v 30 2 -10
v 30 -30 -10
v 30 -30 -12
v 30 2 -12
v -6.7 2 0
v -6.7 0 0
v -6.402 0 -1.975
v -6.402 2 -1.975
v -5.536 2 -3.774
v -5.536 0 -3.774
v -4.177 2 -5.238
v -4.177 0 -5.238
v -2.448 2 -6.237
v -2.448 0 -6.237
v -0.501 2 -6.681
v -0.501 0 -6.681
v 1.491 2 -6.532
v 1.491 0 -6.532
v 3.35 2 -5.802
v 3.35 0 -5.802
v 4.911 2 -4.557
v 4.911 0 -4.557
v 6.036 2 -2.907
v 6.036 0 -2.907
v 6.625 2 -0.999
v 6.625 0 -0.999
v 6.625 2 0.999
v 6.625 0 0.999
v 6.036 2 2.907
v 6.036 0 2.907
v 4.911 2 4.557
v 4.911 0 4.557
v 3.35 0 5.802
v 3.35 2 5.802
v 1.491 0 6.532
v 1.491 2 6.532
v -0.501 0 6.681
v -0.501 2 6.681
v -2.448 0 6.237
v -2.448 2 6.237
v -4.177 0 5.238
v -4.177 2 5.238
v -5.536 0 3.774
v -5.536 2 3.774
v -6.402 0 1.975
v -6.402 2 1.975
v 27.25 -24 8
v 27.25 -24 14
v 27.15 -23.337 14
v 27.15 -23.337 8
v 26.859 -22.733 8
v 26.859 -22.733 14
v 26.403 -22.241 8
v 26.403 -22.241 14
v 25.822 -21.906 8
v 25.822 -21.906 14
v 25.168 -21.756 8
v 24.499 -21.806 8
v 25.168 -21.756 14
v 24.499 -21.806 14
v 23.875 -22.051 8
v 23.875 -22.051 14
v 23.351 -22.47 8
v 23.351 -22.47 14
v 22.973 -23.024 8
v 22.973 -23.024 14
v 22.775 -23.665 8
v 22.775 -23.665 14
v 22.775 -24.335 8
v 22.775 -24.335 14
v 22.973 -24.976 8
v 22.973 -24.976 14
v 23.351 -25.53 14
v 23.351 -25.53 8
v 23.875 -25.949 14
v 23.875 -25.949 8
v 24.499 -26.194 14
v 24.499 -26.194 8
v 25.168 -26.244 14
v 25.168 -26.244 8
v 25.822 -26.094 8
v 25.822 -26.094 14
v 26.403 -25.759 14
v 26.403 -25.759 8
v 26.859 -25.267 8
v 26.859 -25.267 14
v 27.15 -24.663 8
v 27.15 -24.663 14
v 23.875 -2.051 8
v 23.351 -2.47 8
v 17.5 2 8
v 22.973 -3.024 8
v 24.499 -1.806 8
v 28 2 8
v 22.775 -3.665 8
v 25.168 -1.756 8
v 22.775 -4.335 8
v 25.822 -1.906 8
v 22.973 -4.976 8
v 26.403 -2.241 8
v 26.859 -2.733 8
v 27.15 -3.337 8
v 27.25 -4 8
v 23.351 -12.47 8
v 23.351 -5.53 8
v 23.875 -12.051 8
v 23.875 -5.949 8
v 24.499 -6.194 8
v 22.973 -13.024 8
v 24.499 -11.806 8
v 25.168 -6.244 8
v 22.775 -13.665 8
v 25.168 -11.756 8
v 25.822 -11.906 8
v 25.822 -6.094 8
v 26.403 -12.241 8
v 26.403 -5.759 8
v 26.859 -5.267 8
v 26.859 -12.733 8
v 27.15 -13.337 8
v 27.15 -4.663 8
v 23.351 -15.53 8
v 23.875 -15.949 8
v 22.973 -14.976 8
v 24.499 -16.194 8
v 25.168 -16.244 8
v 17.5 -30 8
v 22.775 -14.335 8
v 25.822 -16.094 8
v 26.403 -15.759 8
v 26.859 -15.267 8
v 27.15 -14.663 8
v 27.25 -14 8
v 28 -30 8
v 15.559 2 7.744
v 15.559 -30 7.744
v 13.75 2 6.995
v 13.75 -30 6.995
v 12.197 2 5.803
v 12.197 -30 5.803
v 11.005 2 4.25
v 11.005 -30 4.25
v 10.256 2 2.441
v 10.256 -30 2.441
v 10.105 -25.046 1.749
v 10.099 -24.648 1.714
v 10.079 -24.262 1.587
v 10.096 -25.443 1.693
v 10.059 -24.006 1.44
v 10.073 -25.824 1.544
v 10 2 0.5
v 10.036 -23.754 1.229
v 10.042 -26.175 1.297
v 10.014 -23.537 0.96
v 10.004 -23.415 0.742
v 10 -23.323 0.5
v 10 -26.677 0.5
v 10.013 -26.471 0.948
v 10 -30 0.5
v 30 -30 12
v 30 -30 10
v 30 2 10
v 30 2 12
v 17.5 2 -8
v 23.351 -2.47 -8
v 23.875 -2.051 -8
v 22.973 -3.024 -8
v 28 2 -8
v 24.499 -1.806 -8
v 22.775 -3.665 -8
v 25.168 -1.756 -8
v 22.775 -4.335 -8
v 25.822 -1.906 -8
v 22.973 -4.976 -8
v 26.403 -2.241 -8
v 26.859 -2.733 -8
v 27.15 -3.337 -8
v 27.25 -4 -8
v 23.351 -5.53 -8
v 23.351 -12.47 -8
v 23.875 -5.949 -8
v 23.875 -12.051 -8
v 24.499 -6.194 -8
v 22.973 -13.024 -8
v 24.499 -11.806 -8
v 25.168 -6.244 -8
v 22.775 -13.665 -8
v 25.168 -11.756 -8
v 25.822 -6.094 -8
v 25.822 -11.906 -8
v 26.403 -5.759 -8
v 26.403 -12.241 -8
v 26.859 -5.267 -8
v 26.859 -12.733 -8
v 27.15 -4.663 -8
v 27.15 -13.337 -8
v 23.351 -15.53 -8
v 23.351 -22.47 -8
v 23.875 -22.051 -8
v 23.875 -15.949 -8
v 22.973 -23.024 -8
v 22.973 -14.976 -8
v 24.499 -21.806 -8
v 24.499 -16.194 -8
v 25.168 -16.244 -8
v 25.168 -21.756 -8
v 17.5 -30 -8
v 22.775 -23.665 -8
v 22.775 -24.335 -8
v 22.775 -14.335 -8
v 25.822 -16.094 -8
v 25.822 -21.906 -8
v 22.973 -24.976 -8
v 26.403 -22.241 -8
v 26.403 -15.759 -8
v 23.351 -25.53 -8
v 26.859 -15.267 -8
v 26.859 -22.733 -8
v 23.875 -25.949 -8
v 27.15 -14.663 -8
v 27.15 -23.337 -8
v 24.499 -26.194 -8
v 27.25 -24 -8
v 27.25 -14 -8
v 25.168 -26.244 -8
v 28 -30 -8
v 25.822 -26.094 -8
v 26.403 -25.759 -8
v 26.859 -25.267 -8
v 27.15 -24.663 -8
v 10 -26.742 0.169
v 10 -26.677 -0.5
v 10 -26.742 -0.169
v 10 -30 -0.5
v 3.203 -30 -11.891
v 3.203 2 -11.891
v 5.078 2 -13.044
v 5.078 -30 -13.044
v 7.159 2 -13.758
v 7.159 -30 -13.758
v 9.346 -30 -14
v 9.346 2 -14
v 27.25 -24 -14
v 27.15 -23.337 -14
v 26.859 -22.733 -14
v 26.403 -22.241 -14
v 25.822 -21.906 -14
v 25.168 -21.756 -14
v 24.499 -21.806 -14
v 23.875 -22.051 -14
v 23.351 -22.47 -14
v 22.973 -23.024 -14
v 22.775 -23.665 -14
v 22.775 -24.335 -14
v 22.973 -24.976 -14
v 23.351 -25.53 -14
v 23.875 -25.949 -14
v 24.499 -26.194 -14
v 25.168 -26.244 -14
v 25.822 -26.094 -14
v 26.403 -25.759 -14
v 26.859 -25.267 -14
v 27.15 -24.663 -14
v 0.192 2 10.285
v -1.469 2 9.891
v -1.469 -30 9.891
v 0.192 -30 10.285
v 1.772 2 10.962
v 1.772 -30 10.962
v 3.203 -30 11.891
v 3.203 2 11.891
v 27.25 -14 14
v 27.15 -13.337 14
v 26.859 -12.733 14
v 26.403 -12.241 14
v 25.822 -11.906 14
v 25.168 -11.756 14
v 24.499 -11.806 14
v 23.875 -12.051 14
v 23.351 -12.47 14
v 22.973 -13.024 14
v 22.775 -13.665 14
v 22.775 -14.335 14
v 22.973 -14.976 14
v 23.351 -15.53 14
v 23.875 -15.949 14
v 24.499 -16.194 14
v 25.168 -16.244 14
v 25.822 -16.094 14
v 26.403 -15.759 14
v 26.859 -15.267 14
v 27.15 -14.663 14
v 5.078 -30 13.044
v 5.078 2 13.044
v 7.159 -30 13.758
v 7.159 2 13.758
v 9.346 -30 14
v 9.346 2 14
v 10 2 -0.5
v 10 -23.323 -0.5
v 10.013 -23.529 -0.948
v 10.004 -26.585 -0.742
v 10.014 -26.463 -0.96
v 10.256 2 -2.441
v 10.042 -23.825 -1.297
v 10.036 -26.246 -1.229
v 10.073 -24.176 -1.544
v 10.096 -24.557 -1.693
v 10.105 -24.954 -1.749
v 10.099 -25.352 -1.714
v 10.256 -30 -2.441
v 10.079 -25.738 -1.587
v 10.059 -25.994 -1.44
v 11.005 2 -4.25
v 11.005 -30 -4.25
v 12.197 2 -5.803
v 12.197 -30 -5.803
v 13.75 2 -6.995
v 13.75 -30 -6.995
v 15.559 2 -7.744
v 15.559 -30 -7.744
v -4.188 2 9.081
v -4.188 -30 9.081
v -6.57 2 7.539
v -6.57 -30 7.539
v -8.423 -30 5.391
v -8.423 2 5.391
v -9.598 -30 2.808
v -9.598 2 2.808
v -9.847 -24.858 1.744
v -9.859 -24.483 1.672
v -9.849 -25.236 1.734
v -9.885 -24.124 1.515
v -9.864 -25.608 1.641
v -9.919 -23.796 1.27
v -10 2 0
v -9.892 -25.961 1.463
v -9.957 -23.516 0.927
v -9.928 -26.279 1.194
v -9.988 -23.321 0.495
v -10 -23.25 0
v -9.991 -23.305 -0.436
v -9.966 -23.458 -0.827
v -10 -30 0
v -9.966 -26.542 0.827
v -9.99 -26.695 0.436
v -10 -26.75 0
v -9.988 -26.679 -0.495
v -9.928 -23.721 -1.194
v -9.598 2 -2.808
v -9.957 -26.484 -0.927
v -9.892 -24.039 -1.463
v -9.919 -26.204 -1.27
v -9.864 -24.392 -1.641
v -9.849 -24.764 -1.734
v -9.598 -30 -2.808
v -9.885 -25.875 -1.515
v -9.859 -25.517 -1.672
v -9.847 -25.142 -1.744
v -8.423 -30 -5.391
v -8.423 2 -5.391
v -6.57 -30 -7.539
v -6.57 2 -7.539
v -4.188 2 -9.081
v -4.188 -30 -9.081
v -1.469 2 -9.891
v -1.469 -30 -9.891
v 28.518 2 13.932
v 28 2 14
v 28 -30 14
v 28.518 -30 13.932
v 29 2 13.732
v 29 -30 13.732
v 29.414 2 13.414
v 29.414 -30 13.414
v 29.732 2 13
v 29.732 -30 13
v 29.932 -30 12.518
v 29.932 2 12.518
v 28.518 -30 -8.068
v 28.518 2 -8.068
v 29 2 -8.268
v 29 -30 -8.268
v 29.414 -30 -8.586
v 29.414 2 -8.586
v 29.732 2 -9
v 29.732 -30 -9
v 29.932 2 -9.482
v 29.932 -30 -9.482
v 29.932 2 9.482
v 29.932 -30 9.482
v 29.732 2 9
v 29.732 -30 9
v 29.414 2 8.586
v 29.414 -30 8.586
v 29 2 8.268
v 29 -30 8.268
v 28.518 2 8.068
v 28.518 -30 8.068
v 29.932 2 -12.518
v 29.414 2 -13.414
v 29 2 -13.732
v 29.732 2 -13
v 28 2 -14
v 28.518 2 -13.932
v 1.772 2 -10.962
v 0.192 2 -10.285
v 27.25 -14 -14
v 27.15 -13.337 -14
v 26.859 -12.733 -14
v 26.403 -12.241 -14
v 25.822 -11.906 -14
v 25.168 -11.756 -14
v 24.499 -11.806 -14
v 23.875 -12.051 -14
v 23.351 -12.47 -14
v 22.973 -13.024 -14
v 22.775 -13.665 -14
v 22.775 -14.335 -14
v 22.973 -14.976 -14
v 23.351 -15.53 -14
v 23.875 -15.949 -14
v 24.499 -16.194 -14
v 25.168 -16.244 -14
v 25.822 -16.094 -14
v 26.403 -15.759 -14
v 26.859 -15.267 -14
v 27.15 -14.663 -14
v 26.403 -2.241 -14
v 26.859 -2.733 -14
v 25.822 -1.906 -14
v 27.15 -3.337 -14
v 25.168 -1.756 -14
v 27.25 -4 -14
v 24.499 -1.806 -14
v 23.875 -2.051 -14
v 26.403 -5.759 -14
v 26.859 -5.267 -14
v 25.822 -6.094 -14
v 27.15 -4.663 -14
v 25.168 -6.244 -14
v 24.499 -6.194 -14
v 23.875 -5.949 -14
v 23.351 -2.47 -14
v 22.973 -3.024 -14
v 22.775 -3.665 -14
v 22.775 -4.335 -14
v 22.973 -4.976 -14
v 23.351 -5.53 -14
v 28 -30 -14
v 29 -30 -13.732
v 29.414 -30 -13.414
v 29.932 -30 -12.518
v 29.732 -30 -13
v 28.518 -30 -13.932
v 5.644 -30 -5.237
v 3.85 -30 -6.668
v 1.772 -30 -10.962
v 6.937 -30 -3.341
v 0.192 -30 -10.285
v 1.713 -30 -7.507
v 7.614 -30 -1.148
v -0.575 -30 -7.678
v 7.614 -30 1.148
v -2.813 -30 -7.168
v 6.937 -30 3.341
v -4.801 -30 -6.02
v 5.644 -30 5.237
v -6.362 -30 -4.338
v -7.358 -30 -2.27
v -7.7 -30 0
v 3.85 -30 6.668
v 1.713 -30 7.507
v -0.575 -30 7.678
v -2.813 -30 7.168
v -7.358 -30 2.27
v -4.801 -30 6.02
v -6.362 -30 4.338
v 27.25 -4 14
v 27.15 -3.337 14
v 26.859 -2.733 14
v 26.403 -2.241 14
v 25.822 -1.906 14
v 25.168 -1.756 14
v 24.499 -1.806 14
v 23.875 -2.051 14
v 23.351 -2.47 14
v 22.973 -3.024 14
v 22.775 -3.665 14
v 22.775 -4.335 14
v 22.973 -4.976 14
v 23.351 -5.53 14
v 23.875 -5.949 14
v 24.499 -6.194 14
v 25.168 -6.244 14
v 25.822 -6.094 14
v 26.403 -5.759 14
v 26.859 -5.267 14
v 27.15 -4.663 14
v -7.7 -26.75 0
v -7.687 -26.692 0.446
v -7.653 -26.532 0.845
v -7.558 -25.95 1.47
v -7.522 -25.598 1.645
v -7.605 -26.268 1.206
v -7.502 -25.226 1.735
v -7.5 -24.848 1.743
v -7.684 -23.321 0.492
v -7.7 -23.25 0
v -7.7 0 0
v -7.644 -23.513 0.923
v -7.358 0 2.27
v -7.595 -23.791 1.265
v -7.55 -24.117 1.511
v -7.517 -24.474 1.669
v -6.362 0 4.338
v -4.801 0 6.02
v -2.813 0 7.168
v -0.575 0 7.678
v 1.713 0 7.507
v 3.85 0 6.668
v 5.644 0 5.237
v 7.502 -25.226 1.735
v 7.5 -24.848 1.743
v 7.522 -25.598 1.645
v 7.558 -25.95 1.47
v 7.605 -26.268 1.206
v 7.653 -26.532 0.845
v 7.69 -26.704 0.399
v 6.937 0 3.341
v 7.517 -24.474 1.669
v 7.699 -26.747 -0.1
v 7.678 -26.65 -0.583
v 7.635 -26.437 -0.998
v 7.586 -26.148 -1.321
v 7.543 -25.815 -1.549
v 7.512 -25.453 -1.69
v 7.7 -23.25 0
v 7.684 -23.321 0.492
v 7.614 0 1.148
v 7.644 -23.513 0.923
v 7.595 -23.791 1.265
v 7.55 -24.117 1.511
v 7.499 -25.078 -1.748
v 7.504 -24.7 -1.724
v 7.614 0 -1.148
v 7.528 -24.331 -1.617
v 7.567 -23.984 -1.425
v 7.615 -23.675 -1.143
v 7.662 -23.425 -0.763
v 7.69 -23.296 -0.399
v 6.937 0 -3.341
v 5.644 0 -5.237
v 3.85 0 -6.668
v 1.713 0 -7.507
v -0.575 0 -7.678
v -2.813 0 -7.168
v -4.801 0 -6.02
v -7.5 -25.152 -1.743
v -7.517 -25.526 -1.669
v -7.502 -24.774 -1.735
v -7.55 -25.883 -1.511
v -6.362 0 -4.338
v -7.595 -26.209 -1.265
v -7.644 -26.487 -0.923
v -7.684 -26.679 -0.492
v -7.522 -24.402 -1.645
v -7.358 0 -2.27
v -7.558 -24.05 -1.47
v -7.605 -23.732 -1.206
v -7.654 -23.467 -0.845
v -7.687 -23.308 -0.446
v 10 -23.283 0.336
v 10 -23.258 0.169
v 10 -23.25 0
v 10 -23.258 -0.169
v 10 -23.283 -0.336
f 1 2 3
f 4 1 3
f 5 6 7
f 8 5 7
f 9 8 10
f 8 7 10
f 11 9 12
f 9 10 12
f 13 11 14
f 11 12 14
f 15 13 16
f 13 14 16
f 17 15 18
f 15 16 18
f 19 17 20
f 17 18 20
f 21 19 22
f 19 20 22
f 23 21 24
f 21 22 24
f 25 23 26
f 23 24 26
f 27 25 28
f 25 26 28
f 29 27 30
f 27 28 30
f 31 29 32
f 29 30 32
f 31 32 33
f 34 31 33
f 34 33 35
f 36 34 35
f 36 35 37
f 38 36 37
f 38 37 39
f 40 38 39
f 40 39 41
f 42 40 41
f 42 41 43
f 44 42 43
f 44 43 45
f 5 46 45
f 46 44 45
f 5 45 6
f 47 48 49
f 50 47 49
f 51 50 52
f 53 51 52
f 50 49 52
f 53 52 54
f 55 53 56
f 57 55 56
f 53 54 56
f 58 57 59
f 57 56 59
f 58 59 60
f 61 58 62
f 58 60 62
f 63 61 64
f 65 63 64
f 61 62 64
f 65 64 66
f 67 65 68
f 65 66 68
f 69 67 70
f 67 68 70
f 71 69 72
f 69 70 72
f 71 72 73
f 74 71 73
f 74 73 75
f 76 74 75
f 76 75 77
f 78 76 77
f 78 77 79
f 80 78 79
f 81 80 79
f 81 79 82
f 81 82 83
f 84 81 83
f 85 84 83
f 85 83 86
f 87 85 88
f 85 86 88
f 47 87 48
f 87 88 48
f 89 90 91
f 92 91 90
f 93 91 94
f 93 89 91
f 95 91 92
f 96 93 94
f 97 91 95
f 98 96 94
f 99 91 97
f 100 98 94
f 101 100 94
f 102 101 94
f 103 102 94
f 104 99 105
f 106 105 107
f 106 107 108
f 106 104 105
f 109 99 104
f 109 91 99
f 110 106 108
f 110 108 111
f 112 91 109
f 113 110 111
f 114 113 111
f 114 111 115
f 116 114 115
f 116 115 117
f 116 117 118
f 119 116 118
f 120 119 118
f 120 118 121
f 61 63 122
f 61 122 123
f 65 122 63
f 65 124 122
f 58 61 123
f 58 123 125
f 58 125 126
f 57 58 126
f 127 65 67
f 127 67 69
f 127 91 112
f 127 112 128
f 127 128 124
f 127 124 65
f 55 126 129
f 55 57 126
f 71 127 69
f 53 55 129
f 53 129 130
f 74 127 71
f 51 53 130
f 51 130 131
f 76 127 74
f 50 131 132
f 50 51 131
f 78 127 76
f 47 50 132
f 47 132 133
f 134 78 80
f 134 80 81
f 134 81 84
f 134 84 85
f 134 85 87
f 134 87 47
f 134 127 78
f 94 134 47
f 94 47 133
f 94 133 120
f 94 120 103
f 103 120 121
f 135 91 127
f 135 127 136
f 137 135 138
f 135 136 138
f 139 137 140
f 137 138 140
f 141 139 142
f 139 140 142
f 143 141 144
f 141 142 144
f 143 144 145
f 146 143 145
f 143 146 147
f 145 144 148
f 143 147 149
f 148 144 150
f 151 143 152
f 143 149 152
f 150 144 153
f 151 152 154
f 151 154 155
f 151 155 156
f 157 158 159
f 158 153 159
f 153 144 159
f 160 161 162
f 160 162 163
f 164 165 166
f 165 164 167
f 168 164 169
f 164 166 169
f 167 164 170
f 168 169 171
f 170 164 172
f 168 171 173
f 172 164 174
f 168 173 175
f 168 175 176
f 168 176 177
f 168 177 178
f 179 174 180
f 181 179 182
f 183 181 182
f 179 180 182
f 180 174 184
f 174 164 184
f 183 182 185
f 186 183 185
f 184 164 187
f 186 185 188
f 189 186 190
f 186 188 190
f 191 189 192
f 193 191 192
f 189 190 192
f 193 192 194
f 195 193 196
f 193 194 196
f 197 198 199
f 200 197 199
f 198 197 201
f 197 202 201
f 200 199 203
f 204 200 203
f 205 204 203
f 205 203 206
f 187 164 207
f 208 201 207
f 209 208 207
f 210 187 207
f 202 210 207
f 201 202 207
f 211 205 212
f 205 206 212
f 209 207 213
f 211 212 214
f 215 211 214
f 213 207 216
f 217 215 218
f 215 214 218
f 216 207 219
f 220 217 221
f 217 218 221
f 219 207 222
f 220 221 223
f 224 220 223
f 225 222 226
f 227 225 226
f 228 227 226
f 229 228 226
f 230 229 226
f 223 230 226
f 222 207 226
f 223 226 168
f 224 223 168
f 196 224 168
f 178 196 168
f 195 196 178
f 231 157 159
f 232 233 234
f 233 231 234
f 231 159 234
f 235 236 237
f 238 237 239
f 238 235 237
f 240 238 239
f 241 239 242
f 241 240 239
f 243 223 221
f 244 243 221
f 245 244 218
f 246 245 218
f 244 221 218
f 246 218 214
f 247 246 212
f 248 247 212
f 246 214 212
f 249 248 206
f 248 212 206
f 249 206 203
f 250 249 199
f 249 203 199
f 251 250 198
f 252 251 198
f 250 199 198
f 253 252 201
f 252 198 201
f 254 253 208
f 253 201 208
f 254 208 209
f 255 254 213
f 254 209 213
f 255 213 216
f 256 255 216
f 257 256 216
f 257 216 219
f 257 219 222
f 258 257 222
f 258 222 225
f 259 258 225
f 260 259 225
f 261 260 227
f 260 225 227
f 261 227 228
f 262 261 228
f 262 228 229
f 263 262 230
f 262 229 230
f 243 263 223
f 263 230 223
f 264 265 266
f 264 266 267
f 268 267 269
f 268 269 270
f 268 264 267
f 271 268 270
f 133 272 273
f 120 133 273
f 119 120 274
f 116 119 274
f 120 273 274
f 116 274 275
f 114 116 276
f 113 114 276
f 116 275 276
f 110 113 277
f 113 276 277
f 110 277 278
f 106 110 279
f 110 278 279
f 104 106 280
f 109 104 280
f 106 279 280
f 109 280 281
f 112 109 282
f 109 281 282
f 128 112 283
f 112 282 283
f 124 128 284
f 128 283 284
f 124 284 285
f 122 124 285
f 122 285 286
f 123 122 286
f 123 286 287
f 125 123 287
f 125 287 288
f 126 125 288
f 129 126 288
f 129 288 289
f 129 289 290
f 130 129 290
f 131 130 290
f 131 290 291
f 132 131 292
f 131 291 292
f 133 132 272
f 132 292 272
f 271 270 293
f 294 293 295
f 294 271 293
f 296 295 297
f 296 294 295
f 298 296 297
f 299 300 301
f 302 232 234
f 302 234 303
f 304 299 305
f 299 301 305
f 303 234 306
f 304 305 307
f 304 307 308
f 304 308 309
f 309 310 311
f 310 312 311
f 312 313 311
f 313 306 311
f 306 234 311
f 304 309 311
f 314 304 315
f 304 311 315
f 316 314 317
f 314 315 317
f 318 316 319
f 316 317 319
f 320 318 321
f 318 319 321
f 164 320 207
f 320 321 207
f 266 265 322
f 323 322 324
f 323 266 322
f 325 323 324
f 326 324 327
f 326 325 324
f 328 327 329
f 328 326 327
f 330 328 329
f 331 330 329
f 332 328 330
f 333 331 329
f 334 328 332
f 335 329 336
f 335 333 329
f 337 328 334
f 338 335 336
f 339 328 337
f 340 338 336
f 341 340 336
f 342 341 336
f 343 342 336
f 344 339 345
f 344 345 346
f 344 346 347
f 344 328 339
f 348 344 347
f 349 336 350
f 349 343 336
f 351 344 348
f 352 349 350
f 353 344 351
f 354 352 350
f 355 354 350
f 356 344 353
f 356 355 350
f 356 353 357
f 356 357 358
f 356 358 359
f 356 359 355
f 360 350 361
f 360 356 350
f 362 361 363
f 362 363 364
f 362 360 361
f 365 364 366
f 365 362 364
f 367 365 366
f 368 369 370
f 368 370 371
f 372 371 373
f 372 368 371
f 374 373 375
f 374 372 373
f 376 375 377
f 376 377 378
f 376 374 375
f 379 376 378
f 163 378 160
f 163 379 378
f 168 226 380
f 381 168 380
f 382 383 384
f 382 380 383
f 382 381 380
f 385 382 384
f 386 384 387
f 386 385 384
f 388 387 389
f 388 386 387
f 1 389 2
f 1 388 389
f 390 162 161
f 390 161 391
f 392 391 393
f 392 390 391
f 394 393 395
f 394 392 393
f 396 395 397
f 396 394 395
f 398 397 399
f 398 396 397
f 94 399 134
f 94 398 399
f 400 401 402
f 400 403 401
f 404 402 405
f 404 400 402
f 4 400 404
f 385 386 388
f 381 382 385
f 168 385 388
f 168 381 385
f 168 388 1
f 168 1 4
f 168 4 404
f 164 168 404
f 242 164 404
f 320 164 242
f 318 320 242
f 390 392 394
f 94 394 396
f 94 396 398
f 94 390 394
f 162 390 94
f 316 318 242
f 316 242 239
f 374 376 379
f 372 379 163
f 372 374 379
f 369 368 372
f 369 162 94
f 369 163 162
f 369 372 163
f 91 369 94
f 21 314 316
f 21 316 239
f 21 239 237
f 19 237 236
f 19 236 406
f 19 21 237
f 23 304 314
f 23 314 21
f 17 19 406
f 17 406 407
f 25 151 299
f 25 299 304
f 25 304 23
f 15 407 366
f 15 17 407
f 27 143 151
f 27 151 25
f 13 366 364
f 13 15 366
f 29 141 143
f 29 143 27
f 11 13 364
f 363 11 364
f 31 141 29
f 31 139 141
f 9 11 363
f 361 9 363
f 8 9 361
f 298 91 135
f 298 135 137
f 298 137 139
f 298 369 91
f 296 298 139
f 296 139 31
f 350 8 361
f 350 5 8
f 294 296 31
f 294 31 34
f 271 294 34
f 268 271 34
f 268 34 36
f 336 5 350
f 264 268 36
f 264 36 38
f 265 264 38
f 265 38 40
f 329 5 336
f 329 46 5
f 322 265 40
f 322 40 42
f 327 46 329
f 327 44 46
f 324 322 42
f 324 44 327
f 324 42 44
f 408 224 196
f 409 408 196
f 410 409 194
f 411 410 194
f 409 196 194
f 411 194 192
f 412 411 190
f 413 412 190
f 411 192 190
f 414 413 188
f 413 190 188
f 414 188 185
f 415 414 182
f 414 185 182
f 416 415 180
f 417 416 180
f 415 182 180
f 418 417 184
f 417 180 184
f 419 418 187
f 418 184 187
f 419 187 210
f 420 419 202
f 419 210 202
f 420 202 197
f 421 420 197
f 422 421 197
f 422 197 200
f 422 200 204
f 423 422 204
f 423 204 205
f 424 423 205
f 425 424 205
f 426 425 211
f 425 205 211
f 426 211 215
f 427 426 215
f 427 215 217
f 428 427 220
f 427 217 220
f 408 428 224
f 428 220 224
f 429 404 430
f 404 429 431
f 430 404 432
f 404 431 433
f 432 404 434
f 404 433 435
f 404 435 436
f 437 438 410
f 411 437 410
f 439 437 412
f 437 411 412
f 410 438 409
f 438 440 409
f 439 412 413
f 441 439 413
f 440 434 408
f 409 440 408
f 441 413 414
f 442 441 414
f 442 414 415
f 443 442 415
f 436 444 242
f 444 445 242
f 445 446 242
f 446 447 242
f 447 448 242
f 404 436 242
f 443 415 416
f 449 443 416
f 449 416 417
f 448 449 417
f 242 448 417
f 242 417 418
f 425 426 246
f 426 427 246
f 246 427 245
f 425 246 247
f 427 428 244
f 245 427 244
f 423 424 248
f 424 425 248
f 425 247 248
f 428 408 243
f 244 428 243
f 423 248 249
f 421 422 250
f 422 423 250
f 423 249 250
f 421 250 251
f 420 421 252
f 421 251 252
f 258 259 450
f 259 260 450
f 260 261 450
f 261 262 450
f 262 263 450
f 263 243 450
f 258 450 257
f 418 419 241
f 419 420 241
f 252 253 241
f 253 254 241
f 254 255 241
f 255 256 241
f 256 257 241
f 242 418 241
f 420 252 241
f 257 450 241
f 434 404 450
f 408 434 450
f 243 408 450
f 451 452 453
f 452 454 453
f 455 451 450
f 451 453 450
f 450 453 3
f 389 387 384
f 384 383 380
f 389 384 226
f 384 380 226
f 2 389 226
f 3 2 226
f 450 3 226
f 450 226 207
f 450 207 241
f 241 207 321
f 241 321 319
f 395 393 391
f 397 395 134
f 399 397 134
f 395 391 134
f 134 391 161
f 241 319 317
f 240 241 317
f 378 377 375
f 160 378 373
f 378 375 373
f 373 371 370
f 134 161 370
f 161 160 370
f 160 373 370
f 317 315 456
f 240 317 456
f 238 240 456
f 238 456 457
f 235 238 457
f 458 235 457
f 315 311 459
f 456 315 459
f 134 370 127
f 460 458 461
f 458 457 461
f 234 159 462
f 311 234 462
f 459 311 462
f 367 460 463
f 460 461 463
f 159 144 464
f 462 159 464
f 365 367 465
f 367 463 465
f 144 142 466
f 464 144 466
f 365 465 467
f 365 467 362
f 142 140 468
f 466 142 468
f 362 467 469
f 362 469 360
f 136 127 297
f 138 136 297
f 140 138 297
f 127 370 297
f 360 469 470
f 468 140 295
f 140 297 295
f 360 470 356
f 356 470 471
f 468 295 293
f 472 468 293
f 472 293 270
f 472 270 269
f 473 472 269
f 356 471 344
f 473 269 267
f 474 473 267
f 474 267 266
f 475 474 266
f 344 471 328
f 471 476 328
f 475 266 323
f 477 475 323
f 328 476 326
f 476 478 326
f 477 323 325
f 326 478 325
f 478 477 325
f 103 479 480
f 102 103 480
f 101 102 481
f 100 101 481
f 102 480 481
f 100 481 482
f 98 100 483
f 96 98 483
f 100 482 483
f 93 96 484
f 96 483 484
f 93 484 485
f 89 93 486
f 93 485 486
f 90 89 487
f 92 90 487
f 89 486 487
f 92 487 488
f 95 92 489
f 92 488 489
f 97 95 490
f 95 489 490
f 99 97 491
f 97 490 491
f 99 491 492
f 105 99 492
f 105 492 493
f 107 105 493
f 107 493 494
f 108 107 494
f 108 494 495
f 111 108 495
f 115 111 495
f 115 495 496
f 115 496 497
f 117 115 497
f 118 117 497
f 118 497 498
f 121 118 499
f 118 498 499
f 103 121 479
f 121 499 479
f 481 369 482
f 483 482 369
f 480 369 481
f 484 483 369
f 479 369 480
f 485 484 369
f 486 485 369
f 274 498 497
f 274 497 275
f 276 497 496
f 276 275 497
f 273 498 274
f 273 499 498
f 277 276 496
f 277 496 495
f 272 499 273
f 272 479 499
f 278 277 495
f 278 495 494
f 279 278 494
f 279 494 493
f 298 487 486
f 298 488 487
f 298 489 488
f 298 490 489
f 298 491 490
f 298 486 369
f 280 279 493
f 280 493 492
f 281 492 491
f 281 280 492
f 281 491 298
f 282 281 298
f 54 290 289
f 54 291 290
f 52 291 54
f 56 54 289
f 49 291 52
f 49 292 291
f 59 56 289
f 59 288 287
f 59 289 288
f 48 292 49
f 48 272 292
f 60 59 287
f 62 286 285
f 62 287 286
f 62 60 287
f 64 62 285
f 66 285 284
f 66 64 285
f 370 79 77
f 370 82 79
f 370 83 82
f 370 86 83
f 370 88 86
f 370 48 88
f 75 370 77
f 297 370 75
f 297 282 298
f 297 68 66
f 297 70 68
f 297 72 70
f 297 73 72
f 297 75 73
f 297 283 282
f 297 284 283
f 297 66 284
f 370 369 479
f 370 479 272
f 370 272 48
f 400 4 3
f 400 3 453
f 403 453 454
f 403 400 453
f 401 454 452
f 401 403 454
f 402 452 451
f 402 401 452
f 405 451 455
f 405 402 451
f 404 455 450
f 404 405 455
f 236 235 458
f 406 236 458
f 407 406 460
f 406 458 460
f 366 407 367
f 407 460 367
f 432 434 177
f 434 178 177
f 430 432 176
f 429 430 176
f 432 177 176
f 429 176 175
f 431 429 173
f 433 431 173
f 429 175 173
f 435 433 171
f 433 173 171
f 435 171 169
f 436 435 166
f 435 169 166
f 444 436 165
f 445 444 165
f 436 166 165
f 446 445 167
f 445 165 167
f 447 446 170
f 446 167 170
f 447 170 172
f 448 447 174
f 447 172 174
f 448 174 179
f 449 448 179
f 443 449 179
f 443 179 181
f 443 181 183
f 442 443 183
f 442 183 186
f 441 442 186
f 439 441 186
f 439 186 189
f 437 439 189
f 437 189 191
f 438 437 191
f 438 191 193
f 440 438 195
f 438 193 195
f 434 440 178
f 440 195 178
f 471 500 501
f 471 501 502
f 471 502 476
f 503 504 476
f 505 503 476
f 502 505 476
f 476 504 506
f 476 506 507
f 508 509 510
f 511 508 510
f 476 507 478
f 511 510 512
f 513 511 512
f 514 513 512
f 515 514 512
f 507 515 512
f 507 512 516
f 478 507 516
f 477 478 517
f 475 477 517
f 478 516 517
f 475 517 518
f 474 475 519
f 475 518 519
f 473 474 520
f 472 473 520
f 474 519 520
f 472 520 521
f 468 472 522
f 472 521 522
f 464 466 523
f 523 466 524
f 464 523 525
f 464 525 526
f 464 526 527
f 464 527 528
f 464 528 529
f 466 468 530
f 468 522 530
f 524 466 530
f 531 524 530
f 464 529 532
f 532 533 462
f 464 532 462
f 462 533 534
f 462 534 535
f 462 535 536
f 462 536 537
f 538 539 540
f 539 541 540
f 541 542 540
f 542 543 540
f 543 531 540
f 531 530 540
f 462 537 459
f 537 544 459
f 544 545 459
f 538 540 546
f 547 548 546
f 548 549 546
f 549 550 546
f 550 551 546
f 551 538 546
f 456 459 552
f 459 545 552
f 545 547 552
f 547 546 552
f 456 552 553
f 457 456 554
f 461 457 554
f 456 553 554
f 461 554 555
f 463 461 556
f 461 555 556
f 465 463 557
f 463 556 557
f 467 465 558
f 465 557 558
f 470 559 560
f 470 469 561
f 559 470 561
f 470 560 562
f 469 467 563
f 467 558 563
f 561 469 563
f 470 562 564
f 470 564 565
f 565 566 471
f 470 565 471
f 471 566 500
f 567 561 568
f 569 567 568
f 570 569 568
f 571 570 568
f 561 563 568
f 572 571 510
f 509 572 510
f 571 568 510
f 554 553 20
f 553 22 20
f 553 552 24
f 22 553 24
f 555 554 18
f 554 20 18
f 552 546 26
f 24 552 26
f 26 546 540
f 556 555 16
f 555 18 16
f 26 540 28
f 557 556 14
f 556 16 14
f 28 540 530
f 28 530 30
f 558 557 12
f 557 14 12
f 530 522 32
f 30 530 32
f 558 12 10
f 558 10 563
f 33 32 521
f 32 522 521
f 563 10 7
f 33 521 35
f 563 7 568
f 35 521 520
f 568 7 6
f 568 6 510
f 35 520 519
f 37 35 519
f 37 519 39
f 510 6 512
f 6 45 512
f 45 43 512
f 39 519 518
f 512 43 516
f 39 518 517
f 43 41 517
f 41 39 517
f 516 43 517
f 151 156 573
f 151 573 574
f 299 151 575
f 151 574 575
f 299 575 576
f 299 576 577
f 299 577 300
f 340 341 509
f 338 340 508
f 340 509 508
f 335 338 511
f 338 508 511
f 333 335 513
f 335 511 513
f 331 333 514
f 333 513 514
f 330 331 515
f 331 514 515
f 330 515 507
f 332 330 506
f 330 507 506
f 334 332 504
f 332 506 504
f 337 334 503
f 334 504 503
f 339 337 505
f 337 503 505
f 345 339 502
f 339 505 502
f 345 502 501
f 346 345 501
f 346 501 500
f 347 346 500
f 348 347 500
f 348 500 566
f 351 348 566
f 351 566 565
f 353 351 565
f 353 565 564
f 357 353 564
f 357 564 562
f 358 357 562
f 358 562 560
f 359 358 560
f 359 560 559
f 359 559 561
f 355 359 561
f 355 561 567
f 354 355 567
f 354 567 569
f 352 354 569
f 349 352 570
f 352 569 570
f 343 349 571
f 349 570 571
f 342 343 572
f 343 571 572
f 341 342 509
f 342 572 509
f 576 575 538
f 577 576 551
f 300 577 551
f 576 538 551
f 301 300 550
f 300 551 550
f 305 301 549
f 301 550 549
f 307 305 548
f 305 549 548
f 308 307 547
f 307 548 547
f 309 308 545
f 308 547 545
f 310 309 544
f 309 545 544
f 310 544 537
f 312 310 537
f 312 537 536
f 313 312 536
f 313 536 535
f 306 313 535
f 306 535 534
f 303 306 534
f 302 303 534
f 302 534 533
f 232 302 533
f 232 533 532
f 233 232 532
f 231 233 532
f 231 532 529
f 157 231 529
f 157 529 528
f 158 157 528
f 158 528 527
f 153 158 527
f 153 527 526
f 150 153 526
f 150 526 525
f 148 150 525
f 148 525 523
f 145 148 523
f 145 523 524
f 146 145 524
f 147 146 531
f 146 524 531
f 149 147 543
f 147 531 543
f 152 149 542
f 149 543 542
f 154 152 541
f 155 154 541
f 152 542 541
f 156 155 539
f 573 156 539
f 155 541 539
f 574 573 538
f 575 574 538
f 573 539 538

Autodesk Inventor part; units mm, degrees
ref_plane "YZ Plane" through (0, 0, 0) normal (1, 0, 0) x (0, 1, 0)
ref_plane "XZ Plane" through (0, 0, 0) normal (0, 1, 0) x (-1, 0, 0)
ref_plane "XY Plane" through (0, 0, 0) normal (0, 0, 1) x (1, 0, 0)
sketch "Sketch1" plane through (0, 0, 0) normal (0, 1, 0) x (-1, 0, 0)
  circle A0 centre (0, 0) radius 10
  circle A1 centre (0, 0) radius 6.7
  circle A2 centre (0, 0) radius 7.7
  line L0 (-10, 8) -> (-10, -8)
  line L1 (0, 0) -> (-40.0758, 0) construction
  line L2 (-5, 8) -> (-30, 8)
  line L3 (-30, 8) -> (-30, 14)
  line L4 (-30, 14) -> (-5, 14)
  line L5 (-5, 14) -> (-5, 8)
  line L6 (-5, -8) -> (-30, -8)
  line L7 (-30, -8) -> (-30, -14)
  line L8 (-30, -14) -> (-5, -14)
  line L9 (-5, -14) -> (-5, -8)
  line L10 (0, -10) -> (-5, -11)
  line L11 (0, 10) -> (-5, 11)
  point P0 (-10, 0)
  point P1 (-10, 0)
  point P2 (2.5508, 9.6692)
  point P3 (2.5508, -9.6692)
  point P4 (-30, 11)
  point P5 (-10, 8)
  point P6 (-5, 8.6603)
  point P7 (-5, -8.6603)
  point P8 (-6, -8)
  point P9 (-6, 8)
  dimension "d0" = 13.4
  dimension "d1" = 15.4
  dimension "d37" = 20
  dimension "d38" = 20
  dimension "d39" = 6
  dimension "d40" = 5
  dimension "d46" = 16
extrude "Extrusion1" add sketch "Sketch1" along normal blind 2 contours A0 L9 L6 L2 L5 | A0 L5 L11 | L10 L9 A0 | L5 L2 A0 | A0 L2 L3 L4 L5 | L9 L8 L7 L6 A0 | A0 L6 L9 | A0 L0 L2 | L6 L0 A0 | A2
extrude "Extrusion2" add sketch "Sketch1" against normal blind 30 contours A0 L9 L6 L2 L5 | A0 L5 L11 | L10 L9 A0 | L5 L2 A0 | A0 L2 L3 L4 L5 | L9 L8 L7 L6 A0 | A0 L6 L9 | A0 L0 L2 | L6 L0 A0
sketch "Sketch2" plane through (0, 0, 0) normal (1, 0, 0) x (0, 1, 0)
  circle A0 centre (-25, 0) radius 1.75
  line L0 (-30, -7.7) -> (-30, 7.7) projected
  point P0 (0, 0)
  dimension "d7" = 3.5
  dimension "d8" = 5
extrude "Extrusion3" cut sketch "Sketch2" along normal mid plane 62.5
fillet "Fillet2" radius 7.5 2 edges at (10, -14, -8) (10, -14, 8)
sketch "Sketch4" plane through (29.508, -30, 14) normal (0, 0, 1) x (1, 0, 0)
  circle A0 centre (-4.508, 6) radius 2.25
  circle A1 centre (-4.508, 16) radius 2.25
  circle A2 centre (-4.508, 26) radius 2.25
  line L0 (-4.508, 6) -> (-4.508, 16) construction
  line L1 (-4.508, 16) -> (-4.508, 26) construction
  line L2 (0.492, 0) -> (0.492, 32) projected
  point P0 (-29.508, 30)
  point P1 (0.492, 16)
  point P2 (0.492, 16)
  dimension "d32" = 4.5
  dimension "d33" = 10
  dimension "d41" = 5
extrude "Extrusion7" cut sketch "Sketch4" against normal up to surface (28 mm away)
fillet "Fillet5" radius 10 2 edges at (5, -14, -11) (5, -14, 11)
fillet "Fillet6" radius 10 2 edges at (5, -14, -14) (5, -14, 14)
fillet "Fillet7" radius 10 2 edges at (0, -14, 10) (0, -14, -10)
fillet "Fillet4" radius 2 4 edges at (30, -14, -14) (30, -14, -8) (30, -14, 8) (30, -14, 14)
properties part number "button bottom part 1"
